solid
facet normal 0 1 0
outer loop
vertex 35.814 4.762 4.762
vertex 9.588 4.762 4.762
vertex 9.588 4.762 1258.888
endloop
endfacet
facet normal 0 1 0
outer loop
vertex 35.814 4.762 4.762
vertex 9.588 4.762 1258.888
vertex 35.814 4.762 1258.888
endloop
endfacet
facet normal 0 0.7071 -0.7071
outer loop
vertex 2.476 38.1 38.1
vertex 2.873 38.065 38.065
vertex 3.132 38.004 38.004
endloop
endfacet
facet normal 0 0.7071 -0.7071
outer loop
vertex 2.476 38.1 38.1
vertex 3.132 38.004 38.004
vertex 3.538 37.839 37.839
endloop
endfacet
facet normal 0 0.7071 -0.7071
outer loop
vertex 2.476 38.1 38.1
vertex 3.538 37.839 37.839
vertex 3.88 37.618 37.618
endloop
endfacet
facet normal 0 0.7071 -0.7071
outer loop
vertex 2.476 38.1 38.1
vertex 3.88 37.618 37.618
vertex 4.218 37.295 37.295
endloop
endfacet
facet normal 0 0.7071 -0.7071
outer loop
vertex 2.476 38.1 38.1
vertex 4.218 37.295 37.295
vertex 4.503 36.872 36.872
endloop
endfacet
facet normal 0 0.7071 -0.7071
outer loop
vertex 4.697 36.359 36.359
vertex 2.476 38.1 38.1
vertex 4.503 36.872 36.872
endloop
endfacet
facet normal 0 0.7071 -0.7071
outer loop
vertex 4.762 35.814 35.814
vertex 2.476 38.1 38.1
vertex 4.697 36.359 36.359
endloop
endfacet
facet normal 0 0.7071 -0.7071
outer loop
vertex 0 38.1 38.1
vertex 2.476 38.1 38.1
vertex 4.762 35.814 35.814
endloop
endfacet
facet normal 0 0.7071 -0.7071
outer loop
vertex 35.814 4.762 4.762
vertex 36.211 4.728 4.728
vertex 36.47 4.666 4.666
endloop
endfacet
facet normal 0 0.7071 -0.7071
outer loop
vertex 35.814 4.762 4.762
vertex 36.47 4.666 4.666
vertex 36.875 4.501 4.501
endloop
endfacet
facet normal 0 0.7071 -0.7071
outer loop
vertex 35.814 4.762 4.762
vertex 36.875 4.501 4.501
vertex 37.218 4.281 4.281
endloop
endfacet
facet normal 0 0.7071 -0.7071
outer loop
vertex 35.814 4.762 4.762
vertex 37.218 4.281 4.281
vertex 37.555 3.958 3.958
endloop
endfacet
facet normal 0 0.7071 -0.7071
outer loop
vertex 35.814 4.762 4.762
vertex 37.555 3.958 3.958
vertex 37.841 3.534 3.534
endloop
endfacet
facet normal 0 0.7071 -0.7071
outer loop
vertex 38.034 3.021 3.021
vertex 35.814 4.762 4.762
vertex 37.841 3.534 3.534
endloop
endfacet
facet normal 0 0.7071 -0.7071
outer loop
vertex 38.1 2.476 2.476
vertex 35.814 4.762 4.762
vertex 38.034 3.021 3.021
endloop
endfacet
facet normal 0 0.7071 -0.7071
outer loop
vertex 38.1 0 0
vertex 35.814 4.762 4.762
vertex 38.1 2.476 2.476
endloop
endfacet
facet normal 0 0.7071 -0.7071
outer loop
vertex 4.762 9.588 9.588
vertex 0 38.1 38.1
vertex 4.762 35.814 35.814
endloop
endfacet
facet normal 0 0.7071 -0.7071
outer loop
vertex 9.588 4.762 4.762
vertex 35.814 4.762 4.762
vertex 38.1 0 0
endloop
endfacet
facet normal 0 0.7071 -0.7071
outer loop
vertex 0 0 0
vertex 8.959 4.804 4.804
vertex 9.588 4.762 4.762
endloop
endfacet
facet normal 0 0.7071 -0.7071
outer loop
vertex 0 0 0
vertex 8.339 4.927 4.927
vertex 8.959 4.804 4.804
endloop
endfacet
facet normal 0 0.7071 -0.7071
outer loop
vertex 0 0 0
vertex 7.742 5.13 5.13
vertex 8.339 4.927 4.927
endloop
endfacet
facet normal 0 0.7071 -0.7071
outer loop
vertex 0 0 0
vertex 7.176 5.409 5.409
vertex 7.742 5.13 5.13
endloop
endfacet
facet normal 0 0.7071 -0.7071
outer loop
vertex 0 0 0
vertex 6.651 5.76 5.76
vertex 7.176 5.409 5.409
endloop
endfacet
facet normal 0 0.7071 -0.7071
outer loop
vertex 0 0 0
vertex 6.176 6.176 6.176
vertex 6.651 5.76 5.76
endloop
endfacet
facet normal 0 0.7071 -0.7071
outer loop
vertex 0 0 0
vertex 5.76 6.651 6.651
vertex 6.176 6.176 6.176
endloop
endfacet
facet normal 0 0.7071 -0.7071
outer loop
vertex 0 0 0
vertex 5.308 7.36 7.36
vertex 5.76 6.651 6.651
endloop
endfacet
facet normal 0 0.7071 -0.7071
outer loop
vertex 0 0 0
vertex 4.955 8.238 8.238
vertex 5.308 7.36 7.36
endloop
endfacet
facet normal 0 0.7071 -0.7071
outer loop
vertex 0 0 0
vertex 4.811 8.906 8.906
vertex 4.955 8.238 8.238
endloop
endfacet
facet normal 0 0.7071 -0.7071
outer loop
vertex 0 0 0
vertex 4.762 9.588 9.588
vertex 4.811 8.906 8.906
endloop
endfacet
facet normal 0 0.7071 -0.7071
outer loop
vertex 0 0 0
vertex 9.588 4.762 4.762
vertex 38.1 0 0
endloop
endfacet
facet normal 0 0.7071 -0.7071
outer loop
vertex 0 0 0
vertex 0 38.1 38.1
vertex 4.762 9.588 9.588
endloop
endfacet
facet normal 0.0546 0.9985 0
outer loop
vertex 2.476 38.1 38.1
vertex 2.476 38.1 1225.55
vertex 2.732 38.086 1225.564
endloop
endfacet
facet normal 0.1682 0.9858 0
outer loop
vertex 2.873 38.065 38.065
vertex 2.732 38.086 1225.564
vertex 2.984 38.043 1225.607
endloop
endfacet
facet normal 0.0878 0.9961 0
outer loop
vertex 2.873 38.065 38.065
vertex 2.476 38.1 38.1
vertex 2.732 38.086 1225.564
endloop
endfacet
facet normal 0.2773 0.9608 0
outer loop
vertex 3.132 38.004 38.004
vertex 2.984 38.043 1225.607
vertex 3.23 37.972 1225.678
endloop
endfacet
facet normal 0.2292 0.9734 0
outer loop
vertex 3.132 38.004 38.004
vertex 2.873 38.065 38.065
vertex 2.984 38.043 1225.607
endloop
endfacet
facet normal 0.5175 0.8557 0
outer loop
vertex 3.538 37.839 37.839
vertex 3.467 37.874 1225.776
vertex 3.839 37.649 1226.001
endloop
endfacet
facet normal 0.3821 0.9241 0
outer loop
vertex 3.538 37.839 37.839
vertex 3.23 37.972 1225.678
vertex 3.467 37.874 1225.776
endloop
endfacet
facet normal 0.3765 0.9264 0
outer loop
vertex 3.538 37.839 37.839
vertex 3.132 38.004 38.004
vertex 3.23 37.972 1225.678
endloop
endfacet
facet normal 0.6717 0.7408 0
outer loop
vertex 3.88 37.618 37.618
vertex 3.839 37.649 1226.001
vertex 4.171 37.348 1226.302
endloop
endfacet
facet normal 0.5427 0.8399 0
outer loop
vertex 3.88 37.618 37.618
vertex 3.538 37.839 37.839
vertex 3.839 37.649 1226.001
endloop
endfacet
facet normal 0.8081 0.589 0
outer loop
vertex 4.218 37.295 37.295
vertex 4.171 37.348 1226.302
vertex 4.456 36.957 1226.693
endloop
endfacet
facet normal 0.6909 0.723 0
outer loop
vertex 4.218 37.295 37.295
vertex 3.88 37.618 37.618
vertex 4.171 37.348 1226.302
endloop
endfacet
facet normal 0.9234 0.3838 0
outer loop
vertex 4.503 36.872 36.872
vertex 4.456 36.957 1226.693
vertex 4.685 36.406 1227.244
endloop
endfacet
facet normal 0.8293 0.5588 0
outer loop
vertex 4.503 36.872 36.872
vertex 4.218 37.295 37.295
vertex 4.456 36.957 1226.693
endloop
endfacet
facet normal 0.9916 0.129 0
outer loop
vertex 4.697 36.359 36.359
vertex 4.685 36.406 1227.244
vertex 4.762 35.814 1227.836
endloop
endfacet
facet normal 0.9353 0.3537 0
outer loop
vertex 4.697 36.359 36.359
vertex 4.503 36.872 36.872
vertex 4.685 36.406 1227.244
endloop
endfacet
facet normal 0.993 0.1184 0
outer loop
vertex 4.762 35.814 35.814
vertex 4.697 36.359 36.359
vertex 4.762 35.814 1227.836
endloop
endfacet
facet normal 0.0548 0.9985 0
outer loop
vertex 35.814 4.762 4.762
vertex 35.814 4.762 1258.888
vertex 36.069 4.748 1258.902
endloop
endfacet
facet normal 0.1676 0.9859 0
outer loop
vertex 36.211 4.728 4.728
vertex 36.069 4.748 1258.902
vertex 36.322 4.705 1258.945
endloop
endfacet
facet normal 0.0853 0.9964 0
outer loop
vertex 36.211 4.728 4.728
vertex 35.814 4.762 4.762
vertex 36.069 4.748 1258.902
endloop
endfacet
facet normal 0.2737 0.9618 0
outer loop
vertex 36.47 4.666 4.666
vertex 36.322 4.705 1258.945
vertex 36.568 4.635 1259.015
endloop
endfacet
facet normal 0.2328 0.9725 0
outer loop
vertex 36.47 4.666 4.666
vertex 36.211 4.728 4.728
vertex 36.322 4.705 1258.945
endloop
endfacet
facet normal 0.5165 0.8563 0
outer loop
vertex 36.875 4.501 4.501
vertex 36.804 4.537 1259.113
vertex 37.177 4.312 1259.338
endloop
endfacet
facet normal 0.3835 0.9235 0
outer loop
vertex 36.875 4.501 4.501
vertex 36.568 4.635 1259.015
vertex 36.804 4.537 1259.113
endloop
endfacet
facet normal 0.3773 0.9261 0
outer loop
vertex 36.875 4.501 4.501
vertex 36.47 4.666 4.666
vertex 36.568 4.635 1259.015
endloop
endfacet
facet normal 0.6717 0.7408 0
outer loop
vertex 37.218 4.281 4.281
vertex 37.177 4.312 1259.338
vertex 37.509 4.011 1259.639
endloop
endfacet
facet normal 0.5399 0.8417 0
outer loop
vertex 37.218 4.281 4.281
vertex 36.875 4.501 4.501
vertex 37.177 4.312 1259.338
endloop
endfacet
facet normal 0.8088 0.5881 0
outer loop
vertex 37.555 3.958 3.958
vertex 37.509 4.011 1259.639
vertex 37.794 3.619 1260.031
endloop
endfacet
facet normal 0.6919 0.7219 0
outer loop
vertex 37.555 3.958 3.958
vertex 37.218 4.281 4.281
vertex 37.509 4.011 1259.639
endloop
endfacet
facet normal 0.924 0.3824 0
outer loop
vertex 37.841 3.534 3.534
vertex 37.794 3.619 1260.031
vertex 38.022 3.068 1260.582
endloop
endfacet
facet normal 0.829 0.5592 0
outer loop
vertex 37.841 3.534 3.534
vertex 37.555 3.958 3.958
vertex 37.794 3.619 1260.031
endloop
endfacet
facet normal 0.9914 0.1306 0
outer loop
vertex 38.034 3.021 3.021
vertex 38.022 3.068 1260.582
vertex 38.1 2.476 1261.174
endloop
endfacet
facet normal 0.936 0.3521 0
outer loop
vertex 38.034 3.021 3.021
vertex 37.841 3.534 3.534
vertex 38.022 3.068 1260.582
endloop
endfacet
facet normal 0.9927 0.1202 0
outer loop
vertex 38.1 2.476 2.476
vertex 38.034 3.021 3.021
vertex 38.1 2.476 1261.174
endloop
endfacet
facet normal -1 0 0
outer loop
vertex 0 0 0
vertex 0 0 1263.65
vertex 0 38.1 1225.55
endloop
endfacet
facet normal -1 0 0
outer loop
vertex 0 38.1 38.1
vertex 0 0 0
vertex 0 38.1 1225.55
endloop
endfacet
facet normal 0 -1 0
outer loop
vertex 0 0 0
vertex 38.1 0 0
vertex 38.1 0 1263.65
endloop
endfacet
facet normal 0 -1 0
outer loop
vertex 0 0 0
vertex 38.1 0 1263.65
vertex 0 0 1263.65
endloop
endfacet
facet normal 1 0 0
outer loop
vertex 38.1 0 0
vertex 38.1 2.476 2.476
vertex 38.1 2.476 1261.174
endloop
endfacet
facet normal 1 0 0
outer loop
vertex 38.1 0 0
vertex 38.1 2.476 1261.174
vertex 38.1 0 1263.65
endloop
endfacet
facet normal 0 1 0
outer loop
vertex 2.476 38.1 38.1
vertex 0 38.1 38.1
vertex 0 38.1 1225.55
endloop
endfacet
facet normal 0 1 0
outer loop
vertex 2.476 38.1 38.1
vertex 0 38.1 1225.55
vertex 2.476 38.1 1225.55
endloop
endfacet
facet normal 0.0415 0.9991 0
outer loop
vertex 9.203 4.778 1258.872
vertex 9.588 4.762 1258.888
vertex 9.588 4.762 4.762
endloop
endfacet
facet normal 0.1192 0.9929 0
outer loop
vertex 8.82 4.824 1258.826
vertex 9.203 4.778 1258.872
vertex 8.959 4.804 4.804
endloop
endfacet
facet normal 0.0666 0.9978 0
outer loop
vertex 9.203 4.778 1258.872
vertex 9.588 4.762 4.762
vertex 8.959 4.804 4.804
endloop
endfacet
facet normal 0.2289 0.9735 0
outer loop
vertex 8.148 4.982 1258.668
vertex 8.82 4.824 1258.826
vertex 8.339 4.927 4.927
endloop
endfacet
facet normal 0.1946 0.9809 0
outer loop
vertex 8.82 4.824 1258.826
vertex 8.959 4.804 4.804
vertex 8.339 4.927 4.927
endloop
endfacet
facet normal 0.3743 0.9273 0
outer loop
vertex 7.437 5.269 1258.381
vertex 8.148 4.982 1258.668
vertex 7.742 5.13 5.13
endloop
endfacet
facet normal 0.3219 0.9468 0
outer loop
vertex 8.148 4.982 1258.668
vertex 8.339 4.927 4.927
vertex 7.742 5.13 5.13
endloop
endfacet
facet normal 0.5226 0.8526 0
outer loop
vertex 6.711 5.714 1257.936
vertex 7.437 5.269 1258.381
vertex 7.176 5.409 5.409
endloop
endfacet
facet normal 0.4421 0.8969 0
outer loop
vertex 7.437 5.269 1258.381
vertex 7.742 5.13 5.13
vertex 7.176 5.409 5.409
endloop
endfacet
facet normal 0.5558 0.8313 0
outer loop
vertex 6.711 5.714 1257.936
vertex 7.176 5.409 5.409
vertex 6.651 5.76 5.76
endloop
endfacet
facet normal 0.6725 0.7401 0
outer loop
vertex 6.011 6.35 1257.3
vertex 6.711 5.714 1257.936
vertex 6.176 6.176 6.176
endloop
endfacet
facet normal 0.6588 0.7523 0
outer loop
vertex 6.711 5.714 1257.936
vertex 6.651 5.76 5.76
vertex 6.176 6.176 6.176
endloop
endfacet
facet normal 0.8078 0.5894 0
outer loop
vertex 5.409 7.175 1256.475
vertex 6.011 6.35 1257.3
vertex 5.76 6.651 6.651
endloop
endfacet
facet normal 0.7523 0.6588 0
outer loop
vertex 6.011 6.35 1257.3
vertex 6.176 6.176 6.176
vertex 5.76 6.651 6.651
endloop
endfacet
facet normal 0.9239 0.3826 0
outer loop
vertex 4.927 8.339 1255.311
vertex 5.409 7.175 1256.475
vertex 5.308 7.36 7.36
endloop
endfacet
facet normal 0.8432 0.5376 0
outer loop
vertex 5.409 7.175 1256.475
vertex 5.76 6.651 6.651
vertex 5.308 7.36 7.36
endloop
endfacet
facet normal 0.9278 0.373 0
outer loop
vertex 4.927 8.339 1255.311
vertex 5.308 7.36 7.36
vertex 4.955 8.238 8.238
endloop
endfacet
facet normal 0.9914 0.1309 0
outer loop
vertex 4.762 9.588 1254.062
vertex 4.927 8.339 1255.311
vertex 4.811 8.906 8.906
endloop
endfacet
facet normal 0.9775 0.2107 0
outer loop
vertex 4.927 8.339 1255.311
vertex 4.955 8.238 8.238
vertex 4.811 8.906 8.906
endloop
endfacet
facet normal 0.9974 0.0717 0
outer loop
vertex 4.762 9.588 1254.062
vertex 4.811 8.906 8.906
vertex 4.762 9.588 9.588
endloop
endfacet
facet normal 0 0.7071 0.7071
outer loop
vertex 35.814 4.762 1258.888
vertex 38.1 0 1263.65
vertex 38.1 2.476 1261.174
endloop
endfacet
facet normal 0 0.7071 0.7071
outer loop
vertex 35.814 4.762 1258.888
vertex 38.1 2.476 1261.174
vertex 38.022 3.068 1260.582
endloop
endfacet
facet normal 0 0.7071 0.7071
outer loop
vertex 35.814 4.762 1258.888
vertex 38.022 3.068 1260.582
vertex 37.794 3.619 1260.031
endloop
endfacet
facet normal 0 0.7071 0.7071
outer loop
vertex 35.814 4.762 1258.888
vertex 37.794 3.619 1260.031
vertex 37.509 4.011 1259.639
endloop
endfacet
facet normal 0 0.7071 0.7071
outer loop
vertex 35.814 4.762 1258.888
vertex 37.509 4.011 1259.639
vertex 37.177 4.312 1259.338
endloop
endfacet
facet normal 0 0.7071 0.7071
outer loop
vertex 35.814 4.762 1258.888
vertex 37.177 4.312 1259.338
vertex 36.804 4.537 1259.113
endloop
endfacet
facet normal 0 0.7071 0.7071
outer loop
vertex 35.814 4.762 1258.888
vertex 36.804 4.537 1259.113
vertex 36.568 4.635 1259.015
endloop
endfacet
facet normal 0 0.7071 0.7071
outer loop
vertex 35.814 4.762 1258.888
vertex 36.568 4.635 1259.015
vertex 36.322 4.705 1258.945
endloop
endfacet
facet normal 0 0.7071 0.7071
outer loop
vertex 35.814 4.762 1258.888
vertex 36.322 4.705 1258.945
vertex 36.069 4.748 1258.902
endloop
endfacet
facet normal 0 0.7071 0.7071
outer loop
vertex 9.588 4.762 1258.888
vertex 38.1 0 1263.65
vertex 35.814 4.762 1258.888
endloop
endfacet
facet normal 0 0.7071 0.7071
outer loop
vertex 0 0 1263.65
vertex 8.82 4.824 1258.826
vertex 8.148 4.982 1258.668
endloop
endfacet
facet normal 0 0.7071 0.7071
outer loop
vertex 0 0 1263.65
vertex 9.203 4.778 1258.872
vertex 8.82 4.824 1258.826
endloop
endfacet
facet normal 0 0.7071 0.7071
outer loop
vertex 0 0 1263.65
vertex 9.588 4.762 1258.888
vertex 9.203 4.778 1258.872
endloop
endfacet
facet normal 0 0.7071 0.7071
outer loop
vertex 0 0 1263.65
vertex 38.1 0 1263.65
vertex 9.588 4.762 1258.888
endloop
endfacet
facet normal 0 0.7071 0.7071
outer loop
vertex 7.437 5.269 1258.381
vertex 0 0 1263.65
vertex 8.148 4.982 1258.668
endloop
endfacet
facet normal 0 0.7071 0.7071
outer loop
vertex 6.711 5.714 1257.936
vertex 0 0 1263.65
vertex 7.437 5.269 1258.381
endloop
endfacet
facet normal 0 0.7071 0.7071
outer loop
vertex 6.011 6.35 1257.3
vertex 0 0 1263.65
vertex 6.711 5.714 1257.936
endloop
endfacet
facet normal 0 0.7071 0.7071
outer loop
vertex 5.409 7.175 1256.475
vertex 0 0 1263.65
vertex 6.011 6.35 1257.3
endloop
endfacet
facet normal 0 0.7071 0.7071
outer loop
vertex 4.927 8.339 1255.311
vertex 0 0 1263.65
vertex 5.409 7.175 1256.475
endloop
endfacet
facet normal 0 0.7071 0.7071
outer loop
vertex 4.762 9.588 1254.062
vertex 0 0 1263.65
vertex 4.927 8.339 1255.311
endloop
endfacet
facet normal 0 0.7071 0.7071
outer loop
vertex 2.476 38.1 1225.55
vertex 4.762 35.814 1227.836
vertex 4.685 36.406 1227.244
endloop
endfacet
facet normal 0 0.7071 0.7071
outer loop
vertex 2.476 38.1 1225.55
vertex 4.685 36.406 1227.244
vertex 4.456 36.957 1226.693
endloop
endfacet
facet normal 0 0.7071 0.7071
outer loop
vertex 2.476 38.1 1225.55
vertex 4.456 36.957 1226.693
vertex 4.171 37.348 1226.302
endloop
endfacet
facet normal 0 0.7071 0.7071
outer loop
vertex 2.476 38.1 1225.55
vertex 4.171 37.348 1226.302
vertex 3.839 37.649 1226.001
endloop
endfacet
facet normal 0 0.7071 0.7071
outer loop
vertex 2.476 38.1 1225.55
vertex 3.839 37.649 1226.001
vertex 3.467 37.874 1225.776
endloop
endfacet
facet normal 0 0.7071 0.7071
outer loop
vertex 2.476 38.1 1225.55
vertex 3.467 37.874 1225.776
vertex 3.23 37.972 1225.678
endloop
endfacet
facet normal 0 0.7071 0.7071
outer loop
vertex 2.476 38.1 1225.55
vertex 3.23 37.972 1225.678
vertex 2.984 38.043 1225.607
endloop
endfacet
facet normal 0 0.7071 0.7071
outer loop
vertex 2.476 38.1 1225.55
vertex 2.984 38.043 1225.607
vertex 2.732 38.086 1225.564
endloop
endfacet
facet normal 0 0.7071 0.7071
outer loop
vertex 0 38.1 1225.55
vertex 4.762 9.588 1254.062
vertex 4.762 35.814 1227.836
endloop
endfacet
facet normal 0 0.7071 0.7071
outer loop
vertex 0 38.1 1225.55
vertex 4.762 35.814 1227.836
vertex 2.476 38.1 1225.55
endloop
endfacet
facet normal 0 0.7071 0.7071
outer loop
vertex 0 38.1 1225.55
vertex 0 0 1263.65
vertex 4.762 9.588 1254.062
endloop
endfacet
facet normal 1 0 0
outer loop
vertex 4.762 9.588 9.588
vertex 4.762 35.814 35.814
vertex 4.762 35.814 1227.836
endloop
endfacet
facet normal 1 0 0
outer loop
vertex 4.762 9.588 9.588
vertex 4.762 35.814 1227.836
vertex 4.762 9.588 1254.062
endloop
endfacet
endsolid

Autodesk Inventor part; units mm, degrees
ref_plane "Start plane" through (0, 0, 0) normal (0, 0, 1) x (1, 0, 0)
ref_plane "End plane" through (0, 0, 1263.65) normal (0, 0, 1) x (1, 0, 0)
sketch "Sketch" plane through (0, 0, 0) normal (0, 0, 1) x (1, 0, 0)
  line L0 (38.1, 0) -> (0, 0)
  line L1 (0, 0) -> (0, 38.1)
  line L2 (0, 38.1) -> (2.4765, 38.1)
  line L3 (4.7625, 35.814) -> (4.7625, 9.5885)
  line L4 (9.5885, 4.7625) -> (35.814, 4.7625)
  line L5 (38.1, 2.4765) -> (38.1, 0)
  line L6 (0, -11.0414) -> (0, 31.5385) construction
  line L7 (-11.0414, 0) -> (31.5385, 0) construction
  arc A0 (4.7625, 9.5885) -> (9.5885, 4.7625) centre (9.5885, 9.5885) ccw
  arc A1 (4.7625, 35.814) -> (2.4765, 38.1) centre (2.4765, 35.814) ccw
  arc A2 (38.1, 2.4765) -> (35.814, 4.7625) centre (35.814, 2.4765) ccw
  line L8 (0, 48.4964) -> (0, -20.9644) construction
  line L9 (-20.9644, 0) -> (48.4964, 0) construction
  point P0 (4.7625, 38.1)
  point P1 (4.7625, 4.7625)
  point P2 (38.1, 4.7625)
  dimension "d0" = 38.1
  dimension "d1" = 38.1
  dimension "d2" = 4.7625
  dimension "d3" = 4.7625
  dimension "d10" = 0
  dimension "d11" = 0
  dimension "d14" = 4.826
  dimension "d15" = 2.286
extrude "Body" add sketch "Sketch" along normal up to surface (1263.65 mm away) from surface at 0
sketch "Sketch3" plane through (0, 0, 0) normal (0, 0, 1) x (1, 0, 0)
  line L0 (0, 0) -> (10, 0)
ref_plane "Work Plane3" through (0, 0, 0) normal (0, -1, 0) x (1, 0, 0)
sketch "Sketch4" plane through (0, 0, 0) normal (0, -1, 0) x (1, 0, 0)
  line L0 (-2, 0) -> (12, 0)
  line L1 (-2, 1263.65) -> (12, 1263.65)
  dimension "d17" = 1263.65
ref_plane "Work Plane4" through (19.05, 0, 1263.65) normal (0, 0.7071, 0.7071) x (1, 0, 0)
split "Split1" plane through (19.05, 0, 1263.65) removes the side toward (0, 0.7071, 0.7071)
ref_plane "Work Plane5" through (19.05, 0, 0) normal (0, 0.7071, -0.7071) x (1, 0, 0)
split "Split2" plane through (19.05, 0, 0) removes the side toward (0, 0.7071, -0.7071)
equation "\"d0\" = G_H"
equation "\"d1\" = G_H"
equation "\"d2\" = G_T"
equation "\"d3\" = G_T"
equation "\"d14\" = G_IR"
equation "\"d15\" = G_ER"
equation "\"d4\" = G_L"
equation "\"G_H\" = 38.1"
equation "\"G_T\" = 4.7625"
equation "\"G_ER\" = 2.286"
equation "\"G_IR\" = 4.826"
equation "\"G_L\" = d17"
equation "\"ex\" = 0"
equation "\"G_OFFSET_START\" = 0"
equation "\"G_OFFSET_END\" = 0"
equation "\"d13\" = G_OFFSET_END + B_L"
equation "\"B_L\" = 1263.65"
properties part number "AISC - L 1.5 x 1.5 x 3/16 - 49.75" material "Steel, Mild"
